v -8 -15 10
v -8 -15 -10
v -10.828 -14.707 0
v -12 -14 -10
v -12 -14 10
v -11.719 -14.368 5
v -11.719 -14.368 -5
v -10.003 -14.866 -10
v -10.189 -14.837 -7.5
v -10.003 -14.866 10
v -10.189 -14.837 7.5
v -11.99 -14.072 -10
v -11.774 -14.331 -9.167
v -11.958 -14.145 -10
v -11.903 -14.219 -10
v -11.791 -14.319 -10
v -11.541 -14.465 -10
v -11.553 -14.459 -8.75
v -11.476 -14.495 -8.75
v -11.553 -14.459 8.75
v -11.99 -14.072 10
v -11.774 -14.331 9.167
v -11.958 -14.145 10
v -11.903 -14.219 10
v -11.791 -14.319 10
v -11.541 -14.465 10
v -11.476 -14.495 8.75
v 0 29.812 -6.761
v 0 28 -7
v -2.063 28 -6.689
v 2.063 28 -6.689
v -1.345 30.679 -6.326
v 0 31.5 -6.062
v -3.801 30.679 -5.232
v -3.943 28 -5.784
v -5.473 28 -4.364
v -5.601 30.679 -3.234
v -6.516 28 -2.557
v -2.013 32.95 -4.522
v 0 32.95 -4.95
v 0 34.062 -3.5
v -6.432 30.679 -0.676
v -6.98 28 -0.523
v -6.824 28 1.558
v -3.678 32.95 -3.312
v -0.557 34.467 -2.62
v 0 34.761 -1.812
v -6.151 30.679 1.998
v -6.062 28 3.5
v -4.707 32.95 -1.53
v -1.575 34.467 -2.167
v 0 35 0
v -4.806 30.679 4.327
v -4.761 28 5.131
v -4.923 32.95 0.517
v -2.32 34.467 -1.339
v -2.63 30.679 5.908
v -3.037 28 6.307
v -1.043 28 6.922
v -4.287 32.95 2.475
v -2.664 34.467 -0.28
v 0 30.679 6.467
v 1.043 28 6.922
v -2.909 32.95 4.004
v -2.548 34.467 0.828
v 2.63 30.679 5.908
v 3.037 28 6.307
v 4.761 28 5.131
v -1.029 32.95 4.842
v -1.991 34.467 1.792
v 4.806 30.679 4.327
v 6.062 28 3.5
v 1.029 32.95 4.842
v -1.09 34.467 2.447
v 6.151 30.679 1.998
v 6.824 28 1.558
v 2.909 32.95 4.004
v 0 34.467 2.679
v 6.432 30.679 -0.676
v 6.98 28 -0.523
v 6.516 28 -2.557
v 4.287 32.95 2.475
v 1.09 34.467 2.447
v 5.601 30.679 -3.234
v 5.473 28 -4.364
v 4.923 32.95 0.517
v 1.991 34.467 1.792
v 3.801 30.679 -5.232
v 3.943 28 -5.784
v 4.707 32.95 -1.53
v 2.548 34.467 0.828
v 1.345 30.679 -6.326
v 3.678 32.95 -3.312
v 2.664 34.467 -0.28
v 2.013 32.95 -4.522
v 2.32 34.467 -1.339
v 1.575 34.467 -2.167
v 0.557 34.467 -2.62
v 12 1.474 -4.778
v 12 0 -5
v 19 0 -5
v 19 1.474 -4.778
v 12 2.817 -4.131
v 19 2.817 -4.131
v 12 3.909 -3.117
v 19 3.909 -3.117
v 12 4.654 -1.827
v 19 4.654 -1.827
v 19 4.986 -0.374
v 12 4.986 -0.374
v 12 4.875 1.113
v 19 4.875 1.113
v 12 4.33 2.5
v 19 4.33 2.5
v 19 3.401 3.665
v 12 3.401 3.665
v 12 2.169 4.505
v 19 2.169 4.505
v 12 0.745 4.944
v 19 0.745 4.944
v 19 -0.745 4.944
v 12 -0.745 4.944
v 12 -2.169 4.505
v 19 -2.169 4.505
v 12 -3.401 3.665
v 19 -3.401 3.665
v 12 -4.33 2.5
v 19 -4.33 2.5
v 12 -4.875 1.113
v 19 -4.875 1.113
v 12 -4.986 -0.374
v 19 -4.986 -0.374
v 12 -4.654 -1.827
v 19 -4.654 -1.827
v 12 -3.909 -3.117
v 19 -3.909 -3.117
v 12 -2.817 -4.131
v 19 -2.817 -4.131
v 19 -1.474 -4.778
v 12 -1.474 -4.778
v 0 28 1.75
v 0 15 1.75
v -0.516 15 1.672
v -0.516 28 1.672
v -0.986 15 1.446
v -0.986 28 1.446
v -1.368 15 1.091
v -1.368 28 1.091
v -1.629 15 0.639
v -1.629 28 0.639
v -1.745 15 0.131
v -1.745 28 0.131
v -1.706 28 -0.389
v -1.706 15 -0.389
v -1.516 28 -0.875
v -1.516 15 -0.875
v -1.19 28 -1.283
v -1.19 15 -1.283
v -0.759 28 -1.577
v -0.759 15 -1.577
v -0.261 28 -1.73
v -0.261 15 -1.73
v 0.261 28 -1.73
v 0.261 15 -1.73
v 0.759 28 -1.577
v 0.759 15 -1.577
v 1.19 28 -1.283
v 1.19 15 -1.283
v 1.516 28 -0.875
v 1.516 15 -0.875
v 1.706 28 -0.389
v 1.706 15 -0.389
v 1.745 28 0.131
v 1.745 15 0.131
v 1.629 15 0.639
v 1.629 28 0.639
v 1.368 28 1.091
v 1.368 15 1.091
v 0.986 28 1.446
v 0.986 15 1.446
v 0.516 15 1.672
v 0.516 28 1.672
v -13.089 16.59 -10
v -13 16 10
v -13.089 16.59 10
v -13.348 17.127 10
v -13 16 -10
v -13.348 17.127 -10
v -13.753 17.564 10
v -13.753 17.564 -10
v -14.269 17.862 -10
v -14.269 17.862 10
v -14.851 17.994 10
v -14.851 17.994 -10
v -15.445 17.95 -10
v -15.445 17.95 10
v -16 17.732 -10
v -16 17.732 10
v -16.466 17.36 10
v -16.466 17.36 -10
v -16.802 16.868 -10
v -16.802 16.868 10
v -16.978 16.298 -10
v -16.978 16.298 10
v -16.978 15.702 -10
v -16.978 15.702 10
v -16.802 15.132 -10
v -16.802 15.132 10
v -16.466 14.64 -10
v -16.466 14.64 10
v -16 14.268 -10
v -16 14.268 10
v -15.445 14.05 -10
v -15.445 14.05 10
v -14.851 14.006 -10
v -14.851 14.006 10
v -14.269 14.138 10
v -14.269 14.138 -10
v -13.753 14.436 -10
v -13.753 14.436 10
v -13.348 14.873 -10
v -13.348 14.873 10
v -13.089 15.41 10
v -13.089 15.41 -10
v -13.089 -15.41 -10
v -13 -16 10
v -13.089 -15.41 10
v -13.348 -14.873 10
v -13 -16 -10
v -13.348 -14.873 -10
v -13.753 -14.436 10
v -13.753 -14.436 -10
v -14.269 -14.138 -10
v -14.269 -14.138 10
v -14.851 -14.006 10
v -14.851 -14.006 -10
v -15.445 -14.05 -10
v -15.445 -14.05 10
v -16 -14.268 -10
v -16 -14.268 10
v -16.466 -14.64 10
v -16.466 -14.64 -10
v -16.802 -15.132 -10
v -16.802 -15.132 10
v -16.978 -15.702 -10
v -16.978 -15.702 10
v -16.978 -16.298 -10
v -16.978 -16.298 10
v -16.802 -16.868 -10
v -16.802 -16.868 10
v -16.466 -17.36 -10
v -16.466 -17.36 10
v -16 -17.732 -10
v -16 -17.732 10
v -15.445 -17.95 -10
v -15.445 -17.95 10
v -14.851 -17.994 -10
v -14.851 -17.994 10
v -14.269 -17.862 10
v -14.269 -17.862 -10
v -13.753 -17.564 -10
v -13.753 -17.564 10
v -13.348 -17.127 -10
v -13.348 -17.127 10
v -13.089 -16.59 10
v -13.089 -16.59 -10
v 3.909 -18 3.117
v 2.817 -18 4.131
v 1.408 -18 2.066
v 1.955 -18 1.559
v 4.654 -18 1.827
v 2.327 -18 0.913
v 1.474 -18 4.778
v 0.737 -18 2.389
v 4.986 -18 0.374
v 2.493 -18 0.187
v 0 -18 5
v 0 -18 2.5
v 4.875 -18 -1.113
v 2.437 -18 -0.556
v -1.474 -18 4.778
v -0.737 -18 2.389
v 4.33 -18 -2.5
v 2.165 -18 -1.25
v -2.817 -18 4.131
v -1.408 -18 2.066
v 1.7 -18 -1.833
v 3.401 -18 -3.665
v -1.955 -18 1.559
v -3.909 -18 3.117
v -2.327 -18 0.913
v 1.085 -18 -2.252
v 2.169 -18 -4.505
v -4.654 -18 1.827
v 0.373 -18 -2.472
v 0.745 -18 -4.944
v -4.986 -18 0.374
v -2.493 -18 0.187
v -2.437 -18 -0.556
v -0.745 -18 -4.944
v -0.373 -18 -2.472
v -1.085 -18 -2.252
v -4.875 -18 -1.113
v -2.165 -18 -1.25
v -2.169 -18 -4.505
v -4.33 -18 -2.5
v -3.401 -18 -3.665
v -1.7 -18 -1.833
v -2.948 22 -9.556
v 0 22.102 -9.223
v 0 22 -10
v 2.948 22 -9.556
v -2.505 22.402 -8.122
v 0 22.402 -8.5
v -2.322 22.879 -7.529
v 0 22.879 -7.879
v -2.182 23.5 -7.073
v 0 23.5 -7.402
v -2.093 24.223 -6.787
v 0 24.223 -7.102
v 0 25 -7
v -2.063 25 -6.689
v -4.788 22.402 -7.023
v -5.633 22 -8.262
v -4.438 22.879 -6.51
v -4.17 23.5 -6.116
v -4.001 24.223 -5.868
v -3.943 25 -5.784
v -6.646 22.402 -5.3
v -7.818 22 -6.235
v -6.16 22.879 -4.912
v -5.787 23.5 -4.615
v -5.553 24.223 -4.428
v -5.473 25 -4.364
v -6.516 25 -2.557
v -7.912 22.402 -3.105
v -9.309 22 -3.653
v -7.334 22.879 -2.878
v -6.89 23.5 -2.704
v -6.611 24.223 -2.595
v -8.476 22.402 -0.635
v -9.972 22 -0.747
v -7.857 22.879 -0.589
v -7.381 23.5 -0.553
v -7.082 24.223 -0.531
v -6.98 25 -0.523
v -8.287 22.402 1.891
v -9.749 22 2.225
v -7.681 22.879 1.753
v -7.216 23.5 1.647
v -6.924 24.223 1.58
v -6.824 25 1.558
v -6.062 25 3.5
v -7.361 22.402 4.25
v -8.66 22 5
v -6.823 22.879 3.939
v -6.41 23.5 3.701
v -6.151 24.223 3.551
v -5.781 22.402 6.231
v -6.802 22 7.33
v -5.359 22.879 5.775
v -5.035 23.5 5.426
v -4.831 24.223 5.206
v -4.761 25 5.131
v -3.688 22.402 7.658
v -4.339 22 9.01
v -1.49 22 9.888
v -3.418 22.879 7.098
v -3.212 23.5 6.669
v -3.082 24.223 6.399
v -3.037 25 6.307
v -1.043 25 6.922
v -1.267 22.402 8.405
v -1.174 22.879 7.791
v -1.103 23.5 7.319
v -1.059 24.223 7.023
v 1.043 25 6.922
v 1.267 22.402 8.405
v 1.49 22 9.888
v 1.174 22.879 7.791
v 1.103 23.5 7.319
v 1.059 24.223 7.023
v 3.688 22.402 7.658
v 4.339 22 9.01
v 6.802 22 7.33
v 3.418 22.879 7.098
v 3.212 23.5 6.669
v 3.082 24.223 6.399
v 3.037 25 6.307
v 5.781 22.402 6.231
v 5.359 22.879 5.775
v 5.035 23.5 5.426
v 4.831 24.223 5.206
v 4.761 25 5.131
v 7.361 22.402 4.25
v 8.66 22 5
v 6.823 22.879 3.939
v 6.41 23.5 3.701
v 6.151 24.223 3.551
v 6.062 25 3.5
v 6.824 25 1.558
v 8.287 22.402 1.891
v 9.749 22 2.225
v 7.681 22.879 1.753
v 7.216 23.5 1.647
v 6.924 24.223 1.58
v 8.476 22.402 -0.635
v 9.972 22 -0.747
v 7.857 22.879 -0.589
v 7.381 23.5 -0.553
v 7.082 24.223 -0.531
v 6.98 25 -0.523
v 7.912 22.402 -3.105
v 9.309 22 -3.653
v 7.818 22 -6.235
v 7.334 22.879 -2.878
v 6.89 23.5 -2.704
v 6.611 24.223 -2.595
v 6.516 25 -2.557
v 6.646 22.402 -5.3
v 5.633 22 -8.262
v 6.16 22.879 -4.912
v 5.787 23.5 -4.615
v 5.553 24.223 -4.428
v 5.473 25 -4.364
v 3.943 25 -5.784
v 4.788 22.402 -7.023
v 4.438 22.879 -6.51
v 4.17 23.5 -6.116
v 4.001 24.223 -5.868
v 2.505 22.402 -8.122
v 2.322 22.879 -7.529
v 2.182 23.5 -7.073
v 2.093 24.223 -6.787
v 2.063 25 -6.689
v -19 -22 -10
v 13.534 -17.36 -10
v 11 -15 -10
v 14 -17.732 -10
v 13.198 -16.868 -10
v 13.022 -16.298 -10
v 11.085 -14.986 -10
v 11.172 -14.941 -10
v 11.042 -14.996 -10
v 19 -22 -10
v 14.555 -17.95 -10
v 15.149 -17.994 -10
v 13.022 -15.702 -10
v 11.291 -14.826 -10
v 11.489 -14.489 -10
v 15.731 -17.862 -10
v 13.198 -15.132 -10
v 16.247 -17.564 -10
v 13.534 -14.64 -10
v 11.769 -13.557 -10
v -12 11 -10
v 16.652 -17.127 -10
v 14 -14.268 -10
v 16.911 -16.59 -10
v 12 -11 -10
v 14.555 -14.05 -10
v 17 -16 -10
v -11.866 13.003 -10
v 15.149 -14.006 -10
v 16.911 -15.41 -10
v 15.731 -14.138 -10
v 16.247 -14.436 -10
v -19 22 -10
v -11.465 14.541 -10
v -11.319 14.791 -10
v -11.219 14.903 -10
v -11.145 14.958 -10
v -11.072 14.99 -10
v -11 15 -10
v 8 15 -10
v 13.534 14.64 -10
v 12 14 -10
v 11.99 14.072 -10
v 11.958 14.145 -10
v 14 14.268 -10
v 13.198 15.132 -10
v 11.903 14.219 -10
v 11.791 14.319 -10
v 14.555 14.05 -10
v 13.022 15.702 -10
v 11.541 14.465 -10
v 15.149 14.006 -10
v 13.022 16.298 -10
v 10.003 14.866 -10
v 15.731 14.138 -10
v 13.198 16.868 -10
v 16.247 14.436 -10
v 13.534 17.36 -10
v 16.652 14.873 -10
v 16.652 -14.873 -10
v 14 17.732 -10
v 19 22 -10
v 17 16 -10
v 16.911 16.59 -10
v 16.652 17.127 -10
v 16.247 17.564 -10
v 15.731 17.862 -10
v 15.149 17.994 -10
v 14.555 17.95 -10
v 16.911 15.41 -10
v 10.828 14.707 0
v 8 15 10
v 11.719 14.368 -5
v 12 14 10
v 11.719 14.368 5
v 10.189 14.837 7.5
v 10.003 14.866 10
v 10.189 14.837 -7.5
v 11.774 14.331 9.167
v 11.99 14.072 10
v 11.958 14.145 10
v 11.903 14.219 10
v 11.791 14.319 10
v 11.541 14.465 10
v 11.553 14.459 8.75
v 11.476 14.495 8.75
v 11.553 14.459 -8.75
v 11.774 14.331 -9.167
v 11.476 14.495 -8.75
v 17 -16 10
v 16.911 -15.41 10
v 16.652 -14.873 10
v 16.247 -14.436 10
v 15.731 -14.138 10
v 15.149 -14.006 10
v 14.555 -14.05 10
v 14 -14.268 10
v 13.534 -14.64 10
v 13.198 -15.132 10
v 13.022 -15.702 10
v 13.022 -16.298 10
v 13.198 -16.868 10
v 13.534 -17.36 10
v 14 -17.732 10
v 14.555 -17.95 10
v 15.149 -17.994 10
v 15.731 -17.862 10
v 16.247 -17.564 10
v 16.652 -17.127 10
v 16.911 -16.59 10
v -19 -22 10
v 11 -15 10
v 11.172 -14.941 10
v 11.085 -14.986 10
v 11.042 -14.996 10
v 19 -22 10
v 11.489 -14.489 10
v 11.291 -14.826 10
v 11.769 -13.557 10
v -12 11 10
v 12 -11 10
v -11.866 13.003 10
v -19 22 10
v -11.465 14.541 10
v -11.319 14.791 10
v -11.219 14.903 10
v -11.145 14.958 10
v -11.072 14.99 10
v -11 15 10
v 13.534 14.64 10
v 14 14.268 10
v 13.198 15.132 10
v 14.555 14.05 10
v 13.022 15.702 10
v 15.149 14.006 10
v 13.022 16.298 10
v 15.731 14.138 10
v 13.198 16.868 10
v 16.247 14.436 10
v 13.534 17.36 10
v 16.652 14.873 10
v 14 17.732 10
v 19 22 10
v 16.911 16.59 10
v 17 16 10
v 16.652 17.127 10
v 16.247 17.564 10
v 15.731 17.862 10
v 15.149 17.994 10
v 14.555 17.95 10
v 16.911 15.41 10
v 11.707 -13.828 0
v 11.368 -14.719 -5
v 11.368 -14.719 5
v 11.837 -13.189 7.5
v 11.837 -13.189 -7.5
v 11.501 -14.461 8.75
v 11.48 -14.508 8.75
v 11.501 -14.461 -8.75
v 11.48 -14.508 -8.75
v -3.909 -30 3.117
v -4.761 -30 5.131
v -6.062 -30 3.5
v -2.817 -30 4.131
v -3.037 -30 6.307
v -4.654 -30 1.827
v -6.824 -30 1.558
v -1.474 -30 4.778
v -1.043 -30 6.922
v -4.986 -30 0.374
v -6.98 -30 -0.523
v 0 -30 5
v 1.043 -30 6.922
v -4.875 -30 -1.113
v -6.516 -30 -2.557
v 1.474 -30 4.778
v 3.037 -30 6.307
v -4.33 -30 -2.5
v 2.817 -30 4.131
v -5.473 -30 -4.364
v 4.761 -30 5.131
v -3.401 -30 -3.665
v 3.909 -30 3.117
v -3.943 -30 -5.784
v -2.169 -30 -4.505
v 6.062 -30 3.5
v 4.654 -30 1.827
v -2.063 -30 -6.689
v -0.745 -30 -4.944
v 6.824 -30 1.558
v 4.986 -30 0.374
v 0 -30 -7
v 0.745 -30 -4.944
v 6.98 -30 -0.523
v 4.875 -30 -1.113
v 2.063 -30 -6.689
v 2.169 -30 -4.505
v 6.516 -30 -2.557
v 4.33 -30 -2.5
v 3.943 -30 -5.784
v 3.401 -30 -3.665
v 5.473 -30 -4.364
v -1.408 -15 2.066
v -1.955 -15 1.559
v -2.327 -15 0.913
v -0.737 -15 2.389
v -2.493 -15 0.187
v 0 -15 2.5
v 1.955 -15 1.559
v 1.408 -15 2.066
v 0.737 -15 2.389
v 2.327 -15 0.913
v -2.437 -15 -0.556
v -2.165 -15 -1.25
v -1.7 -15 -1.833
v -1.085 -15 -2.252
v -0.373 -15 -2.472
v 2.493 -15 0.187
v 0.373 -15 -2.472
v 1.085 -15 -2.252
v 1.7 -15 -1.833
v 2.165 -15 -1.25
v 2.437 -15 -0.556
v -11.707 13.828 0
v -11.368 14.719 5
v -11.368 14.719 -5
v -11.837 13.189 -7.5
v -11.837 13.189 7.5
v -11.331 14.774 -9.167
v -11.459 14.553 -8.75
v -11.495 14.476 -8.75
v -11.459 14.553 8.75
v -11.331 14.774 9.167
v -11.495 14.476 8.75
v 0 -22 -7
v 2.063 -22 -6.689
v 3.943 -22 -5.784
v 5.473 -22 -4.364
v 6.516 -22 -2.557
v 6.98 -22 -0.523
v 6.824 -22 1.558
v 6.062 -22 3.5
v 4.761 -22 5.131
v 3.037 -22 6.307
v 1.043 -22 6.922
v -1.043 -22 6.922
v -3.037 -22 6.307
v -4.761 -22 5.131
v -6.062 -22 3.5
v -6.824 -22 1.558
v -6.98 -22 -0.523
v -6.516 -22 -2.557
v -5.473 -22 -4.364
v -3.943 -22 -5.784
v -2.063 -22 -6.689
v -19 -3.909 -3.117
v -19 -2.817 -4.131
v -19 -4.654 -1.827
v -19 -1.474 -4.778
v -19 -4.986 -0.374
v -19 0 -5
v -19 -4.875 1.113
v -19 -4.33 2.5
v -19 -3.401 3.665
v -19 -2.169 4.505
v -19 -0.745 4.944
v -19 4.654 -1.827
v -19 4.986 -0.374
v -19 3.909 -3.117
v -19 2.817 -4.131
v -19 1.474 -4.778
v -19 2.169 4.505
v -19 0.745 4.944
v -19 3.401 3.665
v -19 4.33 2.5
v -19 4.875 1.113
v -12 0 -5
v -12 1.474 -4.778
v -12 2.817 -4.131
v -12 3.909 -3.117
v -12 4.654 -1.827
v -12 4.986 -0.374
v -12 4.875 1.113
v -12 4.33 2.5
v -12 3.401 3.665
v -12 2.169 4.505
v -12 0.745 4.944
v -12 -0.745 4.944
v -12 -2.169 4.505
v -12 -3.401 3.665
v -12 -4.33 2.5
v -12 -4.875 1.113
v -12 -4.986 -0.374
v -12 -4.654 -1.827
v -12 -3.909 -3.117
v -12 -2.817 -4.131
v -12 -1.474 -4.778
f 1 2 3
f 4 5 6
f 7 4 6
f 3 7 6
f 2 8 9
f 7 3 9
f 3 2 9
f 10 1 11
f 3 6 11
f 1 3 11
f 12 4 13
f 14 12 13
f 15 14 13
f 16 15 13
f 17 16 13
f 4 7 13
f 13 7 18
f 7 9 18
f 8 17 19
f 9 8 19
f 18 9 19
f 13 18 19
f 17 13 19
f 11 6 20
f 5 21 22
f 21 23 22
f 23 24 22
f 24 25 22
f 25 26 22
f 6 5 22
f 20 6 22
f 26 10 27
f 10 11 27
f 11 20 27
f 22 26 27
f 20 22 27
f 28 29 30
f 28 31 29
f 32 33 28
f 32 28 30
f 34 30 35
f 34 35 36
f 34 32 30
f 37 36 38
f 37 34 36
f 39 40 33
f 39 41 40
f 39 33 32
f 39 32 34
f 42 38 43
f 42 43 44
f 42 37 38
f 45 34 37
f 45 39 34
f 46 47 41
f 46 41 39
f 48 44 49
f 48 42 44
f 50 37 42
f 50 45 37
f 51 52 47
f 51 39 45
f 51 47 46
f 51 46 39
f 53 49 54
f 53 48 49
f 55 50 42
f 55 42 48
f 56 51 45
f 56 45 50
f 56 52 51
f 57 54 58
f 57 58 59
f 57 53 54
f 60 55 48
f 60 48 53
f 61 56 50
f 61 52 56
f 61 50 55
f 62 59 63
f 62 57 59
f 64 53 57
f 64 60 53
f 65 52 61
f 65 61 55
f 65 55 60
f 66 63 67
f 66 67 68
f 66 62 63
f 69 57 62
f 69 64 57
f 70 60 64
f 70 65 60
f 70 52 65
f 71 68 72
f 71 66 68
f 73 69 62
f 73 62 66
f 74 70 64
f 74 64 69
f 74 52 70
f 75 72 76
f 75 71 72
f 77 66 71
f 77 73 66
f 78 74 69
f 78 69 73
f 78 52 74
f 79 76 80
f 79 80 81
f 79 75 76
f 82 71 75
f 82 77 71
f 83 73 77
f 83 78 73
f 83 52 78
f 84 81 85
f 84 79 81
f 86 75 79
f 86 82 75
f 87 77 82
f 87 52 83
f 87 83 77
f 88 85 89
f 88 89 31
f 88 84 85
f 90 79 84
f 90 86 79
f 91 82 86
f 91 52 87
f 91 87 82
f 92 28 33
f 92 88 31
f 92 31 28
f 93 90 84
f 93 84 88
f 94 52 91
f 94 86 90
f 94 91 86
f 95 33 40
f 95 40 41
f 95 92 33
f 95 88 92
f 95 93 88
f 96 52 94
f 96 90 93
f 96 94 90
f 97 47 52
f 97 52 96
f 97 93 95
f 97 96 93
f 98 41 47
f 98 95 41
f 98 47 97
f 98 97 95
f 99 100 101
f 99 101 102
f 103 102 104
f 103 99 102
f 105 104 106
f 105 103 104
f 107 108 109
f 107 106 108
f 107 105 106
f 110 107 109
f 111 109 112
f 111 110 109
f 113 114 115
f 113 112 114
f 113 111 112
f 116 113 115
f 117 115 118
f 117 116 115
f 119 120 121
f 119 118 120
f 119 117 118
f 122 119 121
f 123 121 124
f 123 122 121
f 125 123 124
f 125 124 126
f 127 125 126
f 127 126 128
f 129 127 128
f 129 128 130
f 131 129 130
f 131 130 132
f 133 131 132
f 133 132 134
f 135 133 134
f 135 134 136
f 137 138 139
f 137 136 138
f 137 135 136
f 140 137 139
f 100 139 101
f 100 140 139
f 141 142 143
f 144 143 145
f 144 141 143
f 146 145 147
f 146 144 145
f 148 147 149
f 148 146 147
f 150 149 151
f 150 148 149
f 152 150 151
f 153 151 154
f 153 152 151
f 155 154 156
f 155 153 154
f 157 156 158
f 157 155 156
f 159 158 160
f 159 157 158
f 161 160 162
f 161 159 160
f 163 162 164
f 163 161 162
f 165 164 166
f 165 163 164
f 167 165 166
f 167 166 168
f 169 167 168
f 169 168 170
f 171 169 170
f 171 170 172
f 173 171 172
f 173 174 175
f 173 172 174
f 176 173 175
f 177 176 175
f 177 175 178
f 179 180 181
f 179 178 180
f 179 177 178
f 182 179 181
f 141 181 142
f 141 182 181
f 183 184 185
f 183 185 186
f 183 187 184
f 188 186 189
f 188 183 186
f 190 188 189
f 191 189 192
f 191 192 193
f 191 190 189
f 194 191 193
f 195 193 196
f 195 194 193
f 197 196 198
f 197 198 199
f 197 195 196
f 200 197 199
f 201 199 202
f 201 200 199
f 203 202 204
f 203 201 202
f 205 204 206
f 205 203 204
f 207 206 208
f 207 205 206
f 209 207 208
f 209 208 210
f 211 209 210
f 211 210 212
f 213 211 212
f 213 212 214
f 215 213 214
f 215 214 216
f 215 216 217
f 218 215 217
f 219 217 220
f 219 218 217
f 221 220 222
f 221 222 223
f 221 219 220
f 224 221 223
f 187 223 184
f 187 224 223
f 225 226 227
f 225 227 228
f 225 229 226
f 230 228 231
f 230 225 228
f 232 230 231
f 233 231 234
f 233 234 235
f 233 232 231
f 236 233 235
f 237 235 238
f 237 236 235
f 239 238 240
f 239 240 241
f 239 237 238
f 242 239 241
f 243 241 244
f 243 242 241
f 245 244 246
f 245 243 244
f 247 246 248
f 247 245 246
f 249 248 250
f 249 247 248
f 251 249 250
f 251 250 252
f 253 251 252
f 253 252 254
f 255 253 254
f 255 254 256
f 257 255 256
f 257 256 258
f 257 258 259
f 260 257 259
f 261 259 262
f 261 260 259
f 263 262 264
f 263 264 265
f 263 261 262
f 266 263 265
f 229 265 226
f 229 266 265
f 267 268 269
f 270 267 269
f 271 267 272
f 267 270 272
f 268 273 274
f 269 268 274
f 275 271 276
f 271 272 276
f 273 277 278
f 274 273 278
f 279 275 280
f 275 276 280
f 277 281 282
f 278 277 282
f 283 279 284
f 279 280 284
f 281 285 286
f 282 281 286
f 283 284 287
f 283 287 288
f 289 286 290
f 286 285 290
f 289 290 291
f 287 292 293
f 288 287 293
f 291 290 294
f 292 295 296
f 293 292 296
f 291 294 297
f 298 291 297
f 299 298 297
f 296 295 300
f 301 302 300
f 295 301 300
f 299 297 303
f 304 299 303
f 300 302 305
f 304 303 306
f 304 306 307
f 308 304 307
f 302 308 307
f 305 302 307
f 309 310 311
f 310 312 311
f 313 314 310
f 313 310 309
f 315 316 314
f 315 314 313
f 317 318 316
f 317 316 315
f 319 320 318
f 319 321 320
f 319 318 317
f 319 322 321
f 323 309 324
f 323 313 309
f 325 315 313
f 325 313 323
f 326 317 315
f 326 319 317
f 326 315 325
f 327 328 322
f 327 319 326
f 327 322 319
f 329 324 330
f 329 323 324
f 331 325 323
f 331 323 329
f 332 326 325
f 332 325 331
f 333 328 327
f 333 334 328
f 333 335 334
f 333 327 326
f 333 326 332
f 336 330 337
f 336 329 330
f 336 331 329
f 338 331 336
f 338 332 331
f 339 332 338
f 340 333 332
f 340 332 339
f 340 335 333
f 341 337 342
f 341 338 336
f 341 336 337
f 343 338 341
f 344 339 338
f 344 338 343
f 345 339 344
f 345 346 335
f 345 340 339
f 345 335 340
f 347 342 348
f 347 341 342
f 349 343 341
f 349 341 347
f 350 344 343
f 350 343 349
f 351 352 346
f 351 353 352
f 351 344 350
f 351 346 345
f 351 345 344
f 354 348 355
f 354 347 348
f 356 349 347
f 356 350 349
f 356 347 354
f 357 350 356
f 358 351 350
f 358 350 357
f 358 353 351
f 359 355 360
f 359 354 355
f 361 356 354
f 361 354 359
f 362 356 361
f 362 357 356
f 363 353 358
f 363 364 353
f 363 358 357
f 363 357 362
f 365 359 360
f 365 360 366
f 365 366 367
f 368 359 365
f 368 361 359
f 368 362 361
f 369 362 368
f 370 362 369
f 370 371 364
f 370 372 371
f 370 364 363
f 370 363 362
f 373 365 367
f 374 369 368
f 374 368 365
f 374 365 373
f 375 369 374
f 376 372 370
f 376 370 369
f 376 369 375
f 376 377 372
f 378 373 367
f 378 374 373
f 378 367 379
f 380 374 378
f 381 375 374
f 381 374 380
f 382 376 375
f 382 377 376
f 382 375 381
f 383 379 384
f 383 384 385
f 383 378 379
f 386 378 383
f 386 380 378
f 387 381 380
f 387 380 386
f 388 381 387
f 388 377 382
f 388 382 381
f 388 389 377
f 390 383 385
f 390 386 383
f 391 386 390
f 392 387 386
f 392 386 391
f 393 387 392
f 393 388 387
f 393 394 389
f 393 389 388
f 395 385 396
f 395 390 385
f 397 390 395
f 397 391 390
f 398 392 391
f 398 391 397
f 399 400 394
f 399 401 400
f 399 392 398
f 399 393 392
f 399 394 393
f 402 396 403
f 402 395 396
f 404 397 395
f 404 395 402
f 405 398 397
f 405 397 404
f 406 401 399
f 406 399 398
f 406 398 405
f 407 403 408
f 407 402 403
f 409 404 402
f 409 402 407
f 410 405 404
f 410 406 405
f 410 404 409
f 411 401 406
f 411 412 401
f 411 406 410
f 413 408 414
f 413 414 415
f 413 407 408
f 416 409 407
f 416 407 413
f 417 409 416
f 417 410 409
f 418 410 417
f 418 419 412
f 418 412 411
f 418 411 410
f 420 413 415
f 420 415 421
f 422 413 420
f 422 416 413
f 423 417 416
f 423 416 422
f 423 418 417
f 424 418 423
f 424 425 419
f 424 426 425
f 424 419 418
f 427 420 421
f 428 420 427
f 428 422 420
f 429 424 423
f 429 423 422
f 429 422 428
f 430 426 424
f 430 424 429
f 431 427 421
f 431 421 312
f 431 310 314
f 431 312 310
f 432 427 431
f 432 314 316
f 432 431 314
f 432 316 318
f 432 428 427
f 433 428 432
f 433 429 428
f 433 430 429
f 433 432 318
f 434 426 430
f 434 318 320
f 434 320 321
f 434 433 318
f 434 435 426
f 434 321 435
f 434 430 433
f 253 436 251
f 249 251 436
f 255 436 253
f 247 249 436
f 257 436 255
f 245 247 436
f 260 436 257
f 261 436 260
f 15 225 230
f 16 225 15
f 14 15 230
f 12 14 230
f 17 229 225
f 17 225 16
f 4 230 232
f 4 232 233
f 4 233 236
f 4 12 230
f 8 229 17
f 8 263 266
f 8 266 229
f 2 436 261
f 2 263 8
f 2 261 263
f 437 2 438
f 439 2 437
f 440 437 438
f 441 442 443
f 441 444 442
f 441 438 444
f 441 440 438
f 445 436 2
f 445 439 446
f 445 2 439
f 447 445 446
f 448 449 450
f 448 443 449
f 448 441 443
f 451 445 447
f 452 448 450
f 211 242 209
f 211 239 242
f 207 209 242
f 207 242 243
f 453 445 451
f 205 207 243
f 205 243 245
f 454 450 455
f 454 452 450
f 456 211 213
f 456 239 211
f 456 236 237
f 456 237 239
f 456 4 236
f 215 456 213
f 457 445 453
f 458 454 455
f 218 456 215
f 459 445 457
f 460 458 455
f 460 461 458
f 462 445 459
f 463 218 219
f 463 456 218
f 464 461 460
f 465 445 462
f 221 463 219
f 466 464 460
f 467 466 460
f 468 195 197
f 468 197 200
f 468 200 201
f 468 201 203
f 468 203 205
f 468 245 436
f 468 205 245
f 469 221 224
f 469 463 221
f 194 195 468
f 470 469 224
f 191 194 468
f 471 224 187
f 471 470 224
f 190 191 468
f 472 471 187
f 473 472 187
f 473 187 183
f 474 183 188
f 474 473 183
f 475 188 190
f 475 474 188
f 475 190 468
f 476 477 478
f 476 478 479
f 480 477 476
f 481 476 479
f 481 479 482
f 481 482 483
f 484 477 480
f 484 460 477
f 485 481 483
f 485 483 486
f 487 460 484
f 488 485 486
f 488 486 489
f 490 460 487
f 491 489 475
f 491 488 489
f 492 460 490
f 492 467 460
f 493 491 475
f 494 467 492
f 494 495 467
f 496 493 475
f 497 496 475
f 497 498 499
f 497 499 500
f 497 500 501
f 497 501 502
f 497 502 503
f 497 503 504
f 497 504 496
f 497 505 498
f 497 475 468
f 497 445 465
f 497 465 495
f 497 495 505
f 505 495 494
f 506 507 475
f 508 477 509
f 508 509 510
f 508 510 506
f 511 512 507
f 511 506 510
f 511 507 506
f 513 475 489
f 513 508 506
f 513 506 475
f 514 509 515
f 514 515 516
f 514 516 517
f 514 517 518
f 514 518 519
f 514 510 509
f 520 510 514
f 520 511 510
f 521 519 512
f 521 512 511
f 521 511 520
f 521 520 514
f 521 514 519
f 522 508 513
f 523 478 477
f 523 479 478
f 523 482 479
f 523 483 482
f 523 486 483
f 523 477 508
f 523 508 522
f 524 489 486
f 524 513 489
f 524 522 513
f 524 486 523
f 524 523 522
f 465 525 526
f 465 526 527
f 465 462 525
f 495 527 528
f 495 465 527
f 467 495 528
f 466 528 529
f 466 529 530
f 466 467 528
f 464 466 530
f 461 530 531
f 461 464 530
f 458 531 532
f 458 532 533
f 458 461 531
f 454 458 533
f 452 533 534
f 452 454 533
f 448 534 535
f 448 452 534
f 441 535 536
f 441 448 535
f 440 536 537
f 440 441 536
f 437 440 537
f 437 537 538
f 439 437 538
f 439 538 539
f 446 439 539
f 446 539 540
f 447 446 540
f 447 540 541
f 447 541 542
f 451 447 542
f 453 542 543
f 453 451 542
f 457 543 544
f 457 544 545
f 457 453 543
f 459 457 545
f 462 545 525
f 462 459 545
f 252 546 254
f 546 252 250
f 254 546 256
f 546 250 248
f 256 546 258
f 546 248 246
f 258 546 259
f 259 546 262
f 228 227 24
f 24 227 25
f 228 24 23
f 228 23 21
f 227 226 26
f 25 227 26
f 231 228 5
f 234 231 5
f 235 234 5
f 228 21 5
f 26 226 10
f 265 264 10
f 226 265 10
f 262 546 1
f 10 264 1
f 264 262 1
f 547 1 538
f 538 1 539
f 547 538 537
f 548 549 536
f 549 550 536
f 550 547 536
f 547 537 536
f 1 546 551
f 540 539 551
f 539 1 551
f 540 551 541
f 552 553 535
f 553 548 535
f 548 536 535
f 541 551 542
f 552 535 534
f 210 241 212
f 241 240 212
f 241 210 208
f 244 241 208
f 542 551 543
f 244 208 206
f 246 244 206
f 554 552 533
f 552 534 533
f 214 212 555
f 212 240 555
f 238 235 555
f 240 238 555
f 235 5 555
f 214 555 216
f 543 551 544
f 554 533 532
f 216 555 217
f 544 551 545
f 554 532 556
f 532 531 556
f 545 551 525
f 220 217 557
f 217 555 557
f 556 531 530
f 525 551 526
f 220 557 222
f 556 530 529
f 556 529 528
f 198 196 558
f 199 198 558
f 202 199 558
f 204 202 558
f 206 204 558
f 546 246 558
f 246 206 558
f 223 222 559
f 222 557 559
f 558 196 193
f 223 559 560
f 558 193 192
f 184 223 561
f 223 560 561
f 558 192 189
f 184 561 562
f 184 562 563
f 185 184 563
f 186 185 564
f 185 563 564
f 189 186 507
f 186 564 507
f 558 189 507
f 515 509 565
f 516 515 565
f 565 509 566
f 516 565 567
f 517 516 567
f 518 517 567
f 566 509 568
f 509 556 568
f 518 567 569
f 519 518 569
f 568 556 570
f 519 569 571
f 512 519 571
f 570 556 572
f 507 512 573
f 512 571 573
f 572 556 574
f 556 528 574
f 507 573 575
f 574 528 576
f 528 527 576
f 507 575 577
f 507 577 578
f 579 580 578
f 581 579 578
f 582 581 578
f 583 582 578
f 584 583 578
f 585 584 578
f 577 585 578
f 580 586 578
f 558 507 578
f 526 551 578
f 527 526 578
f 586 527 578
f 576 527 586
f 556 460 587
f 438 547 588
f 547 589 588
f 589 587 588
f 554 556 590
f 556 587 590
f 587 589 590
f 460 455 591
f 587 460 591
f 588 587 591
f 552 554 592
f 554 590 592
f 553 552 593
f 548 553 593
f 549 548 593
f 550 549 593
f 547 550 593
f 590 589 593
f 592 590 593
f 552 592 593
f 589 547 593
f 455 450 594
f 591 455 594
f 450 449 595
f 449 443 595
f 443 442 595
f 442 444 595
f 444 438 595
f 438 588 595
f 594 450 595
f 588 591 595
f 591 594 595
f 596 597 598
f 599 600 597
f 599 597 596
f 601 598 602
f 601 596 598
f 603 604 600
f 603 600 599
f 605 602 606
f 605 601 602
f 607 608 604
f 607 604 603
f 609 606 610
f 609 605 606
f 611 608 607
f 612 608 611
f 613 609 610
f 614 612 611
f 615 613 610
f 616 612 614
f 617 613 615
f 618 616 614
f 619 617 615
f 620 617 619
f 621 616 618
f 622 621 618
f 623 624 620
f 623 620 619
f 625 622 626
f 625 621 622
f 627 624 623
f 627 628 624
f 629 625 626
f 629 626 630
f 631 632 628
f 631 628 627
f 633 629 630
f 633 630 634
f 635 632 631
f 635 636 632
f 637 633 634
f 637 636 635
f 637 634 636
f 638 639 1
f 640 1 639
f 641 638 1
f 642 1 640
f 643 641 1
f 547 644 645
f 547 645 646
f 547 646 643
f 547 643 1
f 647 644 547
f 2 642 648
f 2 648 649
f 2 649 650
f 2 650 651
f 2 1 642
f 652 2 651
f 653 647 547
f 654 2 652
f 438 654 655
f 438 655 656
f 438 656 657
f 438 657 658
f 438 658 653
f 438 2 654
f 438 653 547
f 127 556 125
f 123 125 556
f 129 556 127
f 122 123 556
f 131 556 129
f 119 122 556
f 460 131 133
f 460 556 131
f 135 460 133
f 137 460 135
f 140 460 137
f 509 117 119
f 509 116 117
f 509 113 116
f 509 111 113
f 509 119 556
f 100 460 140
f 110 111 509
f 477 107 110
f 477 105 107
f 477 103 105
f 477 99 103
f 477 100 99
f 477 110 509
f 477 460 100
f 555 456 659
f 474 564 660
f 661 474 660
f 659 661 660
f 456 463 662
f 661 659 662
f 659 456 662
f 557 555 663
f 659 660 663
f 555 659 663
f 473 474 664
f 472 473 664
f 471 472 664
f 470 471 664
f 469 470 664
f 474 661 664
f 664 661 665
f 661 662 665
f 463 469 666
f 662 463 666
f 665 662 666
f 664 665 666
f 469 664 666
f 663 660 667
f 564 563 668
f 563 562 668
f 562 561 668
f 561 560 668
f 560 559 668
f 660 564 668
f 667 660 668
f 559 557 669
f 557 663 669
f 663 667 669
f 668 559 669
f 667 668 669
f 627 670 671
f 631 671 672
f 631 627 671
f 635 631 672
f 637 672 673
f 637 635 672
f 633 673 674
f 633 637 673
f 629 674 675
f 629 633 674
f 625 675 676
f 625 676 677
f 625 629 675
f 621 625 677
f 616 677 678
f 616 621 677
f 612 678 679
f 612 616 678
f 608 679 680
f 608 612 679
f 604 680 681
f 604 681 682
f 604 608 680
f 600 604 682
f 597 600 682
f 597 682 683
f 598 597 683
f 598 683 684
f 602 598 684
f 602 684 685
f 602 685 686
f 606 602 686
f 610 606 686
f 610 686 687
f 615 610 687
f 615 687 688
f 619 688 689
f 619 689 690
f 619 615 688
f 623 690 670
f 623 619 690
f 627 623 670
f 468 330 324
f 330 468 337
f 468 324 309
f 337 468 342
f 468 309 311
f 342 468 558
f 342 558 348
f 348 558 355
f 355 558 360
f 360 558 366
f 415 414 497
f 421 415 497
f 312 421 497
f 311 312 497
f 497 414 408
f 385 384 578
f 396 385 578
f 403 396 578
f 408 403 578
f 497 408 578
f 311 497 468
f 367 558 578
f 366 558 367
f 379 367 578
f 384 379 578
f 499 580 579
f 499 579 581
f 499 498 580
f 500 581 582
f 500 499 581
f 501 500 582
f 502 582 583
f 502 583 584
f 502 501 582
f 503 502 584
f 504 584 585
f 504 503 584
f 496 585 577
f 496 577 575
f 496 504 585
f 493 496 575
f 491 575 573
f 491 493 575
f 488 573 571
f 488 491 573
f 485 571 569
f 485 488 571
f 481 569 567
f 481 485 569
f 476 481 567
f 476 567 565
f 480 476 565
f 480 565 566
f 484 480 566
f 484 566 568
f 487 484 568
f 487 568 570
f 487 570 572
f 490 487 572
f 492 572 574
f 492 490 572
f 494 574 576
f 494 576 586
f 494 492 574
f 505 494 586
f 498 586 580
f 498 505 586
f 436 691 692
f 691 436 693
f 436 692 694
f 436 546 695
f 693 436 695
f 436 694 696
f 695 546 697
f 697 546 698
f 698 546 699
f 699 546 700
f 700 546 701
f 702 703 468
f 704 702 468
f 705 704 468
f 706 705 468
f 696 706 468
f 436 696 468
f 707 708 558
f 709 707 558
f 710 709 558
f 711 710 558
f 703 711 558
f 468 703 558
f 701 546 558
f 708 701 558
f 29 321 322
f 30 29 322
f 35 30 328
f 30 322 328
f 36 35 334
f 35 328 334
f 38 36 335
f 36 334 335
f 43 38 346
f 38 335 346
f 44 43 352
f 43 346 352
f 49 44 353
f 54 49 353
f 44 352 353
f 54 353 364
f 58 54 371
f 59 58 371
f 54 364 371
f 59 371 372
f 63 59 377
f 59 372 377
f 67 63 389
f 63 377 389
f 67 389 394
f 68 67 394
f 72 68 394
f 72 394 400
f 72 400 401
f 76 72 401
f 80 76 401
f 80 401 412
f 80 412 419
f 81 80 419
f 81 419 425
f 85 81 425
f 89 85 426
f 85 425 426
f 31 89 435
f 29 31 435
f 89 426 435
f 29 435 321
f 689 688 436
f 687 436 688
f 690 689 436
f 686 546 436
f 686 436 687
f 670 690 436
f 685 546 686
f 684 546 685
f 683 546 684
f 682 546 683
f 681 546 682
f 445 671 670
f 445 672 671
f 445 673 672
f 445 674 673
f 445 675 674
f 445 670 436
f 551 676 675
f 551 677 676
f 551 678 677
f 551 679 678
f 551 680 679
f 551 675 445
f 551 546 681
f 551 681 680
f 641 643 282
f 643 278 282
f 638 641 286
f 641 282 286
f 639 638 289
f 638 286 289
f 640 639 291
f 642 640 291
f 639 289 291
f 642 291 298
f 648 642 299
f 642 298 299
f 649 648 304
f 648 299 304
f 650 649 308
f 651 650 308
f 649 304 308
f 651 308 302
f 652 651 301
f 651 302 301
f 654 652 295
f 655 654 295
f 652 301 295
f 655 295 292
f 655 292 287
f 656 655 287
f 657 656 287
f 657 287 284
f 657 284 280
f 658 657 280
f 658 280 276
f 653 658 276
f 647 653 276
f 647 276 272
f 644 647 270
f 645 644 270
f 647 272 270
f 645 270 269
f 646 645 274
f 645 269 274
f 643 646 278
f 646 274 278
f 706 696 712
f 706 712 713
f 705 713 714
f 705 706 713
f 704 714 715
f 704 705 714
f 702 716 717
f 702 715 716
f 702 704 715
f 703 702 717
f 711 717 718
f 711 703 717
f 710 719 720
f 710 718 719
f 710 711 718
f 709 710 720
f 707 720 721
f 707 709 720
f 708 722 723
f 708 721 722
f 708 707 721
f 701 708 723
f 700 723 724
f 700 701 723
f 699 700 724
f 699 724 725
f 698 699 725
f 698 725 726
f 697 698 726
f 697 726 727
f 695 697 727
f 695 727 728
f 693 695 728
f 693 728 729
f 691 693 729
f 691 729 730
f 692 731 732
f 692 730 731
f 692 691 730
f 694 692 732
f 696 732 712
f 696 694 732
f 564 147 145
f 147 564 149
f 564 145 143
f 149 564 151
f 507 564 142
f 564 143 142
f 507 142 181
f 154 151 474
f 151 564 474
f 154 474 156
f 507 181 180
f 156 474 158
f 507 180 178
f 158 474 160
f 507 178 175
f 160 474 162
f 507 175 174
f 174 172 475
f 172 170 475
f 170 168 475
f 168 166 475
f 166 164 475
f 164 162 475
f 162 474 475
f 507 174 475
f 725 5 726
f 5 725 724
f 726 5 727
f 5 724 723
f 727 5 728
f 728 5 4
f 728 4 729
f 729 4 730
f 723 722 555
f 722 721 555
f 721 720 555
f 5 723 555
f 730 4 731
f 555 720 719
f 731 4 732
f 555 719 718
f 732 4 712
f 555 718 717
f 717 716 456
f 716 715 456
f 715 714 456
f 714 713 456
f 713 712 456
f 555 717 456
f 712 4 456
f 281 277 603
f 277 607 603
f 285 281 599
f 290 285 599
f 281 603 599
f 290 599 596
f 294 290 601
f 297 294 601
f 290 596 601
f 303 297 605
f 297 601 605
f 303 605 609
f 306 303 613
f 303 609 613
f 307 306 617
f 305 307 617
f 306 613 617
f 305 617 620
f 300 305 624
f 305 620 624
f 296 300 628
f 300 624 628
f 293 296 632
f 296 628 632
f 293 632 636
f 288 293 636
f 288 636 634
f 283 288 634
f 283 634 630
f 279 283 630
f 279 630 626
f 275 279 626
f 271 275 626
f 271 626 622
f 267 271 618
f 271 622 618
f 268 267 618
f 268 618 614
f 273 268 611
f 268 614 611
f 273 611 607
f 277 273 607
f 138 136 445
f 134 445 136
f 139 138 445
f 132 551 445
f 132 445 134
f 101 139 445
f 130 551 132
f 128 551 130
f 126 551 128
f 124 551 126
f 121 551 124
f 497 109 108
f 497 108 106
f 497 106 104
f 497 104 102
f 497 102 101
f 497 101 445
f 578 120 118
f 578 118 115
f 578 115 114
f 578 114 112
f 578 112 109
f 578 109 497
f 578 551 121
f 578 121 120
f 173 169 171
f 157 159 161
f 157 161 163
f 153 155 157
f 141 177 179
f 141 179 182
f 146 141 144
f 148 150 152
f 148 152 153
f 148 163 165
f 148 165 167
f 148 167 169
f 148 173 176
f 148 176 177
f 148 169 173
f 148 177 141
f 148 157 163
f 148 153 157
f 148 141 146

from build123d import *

# Parameters (mm, degrees)
SKETCH1_W               = 38
SKETCH1_H               = 44
SKETCH1_R               = 2
BOSS_EXTRUDE1_DEPTH     = 10
SKETCH2_R               = 7
BOSS_EXTRUDE2_DEPTH     = 13
FILLET1_R               = 3
FILLET2_R               = 7
CUT_EXTRUDE1_DEPTH      = 42.060930335
CUT_EXTRUDE1_DEPTH_BACK = 42.060930335
SKETCH3_W               = 24
SKETCH3_H               = 30
BOSS_EXTRUDE3_START     = 8
SKETCH4_R               = 7
BOSS_EXTRUDE3_DEPTH     = 8
CUT_EXTRUDE2_DEPTH      = 42.060930335
CUT_EXTRUDE2_DEPTH_BACK = 42.060930335
SKETCH8_R               = 5
CUT_EXTRUDE3_DEPTH      = 50.859803449
CUT_EXTRUDE3_DEPTH_BACK = 13
SKETCH9_R               = 1.75
FILLET3_SIZE            = 4
FILLET3_SIZE_2          = 1


# Some blends are built 0.0001 mm under size
with BuildPart() as part:
    # Sketch1 → Boss-Extrude1 (new, symmetric)
    with BuildSketch(Plane.XY):
        Rectangle(SKETCH1_W, SKETCH1_H)
        with Locations((-15, 16)):
            Circle(SKETCH1_R, mode=Mode.SUBTRACT)
        with Locations((15, 16)):
            Circle(SKETCH1_R, mode=Mode.SUBTRACT)
        with Locations((15, -16)):
            Circle(SKETCH1_R, mode=Mode.SUBTRACT)
        with Locations((-15, -16)):
            Circle(SKETCH1_R, mode=Mode.SUBTRACT)
    extrude(amount=BOSS_EXTRUDE1_DEPTH, both=True)

    # Sketch2 → Boss-Extrude2 (add)
    with BuildSketch(Plane(origin=(0, 22, 0), x_dir=(1, 0, 0), z_dir=(0, 1, 0))):
        with Locations(Location((0, 0, 0), (0, 0, 90))):
            Circle(SKETCH2_R)
    extrude(amount=BOSS_EXTRUDE2_DEPTH)

    # Fillet1
    fillet1_edges = [part.edges().sort_by_distance(p)[0] for p in [
        (0, 22, 7),
    ]]
    fillet(fillet1_edges, radius=FILLET1_R - 0.0001)  # a hair under: the kernel refuses the full size

    # Fillet2
    fillet2_edges = [part.edges().sort_by_distance(p)[0] for p in [
        (0, 35, 7),
    ]]
    fillet(fillet2_edges, radius=FILLET2_R)

    # Sketch3 → Cut-Extrude1 (cut, two sides: drawn at the far end of the back side and taken through both)
    with BuildSketch(Plane.XY.offset(-CUT_EXTRUDE1_DEPTH_BACK)):
        Rectangle(SKETCH3_W, SKETCH3_H)
    extrude(amount=CUT_EXTRUDE1_DEPTH + CUT_EXTRUDE1_DEPTH_BACK, mode=Mode.SUBTRACT)

    # Sketch4 → Boss-Extrude3 (add)
    with BuildSketch(Plane.XZ.offset(22).offset(BOSS_EXTRUDE3_START)):
        with Locations(Location((0, 0, 0), (0, 0, 270))):
            Circle(SKETCH4_R)
    extrude(amount=-BOSS_EXTRUDE3_DEPTH)

    # Sketch7 → Cut-Revolve1 (revolve, cut)
    with BuildSketch(Plane(origin=(0, 0, 0), x_dir=(0, 0, -1), z_dir=(1, 0, 0)), mode=Mode.PRIVATE) as cut_revolve1_sk:
        Polygon((0, -30), (0, -12.56), (2.5, -12.56), (2.5, -18), (5, -18), (5, -30), align=None)
    revolve(cut_revolve1_sk.sketch.rotate(Axis((0, -30, 0), (0, -1, 0)), 180), axis=Axis((0, -30, 0), (0, -1, 0)), mode=Mode.SUBTRACT)

    # Sketch8 → Cut-Extrude2 (cut, two sides: drawn at the far end of the back side and taken through both)
    with BuildSketch(Plane(origin=(0, 0, 0), x_dir=(0, 0, -1), z_dir=(1, 0, 0)).offset(-CUT_EXTRUDE2_DEPTH_BACK)):
        Circle(SKETCH8_R)
    extrude(amount=CUT_EXTRUDE2_DEPTH + CUT_EXTRUDE2_DEPTH_BACK, mode=Mode.SUBTRACT)

    # Sketch9 → Cut-Extrude3 (cut, two sides: drawn at the far end of the back side and taken through both)
    with BuildSketch(Plane.XZ.offset(-15).offset(-CUT_EXTRUDE3_DEPTH_BACK)):
        with Locations(Location((0, 0, 0), (0, 0, 90))):
            Circle(SKETCH9_R)
    extrude(amount=CUT_EXTRUDE3_DEPTH + CUT_EXTRUDE3_DEPTH_BACK, mode=Mode.SUBTRACT)

    # Fillet3
    # an asymmetric fillet: 4, 1 mm, written as the material it adds along each edge
    with BuildSketch(Plane(origin=(12, -15, -10), x_dir=(0, 1, 0), z_dir=(0, 0, 1))) as fillet3_piece_1:
        with BuildLine():
            Bezier((FILLET3_SIZE, 0), (0, 0), (0, FILLET3_SIZE_2), weights=[1, 0.707106781, 1])
            Line((0, FILLET3_SIZE_2), (0, 0))
            Line((0, 0), (FILLET3_SIZE, 0))
        make_face()
    extrude(amount=20)
    with BuildSketch(Plane(origin=(12, 15, -10), x_dir=(0, -1, 0), z_dir=(0, 0, 1))) as fillet3_piece_2:
        with BuildLine():
            Bezier((FILLET3_SIZE_2, 0), (0, 0), (0, -FILLET3_SIZE), weights=[1, 0.707106781, 1])
            Line((0, -FILLET3_SIZE), (0, 0))
            Line((0, 0), (FILLET3_SIZE_2, 0))
        make_face()
    extrude(amount=20)
    with BuildSketch(Plane(origin=(-12, -15, 10), x_dir=(0, 1, 0), z_dir=(0, 0, -1)), Plane(origin=(-12, 15, 10), x_dir=(1, 0, 0), z_dir=(0, 0, -1))) as fillet3_piece_3:
        with BuildLine():
            Bezier((FILLET3_SIZE_2, 0), (0, 0), (0, FILLET3_SIZE), weights=[1, 0.707106781, 1])
            Line((0, FILLET3_SIZE), (0, 0))
            Line((0, 0), (FILLET3_SIZE_2, 0))
        make_face()
    extrude(amount=20)


solid = part.part
